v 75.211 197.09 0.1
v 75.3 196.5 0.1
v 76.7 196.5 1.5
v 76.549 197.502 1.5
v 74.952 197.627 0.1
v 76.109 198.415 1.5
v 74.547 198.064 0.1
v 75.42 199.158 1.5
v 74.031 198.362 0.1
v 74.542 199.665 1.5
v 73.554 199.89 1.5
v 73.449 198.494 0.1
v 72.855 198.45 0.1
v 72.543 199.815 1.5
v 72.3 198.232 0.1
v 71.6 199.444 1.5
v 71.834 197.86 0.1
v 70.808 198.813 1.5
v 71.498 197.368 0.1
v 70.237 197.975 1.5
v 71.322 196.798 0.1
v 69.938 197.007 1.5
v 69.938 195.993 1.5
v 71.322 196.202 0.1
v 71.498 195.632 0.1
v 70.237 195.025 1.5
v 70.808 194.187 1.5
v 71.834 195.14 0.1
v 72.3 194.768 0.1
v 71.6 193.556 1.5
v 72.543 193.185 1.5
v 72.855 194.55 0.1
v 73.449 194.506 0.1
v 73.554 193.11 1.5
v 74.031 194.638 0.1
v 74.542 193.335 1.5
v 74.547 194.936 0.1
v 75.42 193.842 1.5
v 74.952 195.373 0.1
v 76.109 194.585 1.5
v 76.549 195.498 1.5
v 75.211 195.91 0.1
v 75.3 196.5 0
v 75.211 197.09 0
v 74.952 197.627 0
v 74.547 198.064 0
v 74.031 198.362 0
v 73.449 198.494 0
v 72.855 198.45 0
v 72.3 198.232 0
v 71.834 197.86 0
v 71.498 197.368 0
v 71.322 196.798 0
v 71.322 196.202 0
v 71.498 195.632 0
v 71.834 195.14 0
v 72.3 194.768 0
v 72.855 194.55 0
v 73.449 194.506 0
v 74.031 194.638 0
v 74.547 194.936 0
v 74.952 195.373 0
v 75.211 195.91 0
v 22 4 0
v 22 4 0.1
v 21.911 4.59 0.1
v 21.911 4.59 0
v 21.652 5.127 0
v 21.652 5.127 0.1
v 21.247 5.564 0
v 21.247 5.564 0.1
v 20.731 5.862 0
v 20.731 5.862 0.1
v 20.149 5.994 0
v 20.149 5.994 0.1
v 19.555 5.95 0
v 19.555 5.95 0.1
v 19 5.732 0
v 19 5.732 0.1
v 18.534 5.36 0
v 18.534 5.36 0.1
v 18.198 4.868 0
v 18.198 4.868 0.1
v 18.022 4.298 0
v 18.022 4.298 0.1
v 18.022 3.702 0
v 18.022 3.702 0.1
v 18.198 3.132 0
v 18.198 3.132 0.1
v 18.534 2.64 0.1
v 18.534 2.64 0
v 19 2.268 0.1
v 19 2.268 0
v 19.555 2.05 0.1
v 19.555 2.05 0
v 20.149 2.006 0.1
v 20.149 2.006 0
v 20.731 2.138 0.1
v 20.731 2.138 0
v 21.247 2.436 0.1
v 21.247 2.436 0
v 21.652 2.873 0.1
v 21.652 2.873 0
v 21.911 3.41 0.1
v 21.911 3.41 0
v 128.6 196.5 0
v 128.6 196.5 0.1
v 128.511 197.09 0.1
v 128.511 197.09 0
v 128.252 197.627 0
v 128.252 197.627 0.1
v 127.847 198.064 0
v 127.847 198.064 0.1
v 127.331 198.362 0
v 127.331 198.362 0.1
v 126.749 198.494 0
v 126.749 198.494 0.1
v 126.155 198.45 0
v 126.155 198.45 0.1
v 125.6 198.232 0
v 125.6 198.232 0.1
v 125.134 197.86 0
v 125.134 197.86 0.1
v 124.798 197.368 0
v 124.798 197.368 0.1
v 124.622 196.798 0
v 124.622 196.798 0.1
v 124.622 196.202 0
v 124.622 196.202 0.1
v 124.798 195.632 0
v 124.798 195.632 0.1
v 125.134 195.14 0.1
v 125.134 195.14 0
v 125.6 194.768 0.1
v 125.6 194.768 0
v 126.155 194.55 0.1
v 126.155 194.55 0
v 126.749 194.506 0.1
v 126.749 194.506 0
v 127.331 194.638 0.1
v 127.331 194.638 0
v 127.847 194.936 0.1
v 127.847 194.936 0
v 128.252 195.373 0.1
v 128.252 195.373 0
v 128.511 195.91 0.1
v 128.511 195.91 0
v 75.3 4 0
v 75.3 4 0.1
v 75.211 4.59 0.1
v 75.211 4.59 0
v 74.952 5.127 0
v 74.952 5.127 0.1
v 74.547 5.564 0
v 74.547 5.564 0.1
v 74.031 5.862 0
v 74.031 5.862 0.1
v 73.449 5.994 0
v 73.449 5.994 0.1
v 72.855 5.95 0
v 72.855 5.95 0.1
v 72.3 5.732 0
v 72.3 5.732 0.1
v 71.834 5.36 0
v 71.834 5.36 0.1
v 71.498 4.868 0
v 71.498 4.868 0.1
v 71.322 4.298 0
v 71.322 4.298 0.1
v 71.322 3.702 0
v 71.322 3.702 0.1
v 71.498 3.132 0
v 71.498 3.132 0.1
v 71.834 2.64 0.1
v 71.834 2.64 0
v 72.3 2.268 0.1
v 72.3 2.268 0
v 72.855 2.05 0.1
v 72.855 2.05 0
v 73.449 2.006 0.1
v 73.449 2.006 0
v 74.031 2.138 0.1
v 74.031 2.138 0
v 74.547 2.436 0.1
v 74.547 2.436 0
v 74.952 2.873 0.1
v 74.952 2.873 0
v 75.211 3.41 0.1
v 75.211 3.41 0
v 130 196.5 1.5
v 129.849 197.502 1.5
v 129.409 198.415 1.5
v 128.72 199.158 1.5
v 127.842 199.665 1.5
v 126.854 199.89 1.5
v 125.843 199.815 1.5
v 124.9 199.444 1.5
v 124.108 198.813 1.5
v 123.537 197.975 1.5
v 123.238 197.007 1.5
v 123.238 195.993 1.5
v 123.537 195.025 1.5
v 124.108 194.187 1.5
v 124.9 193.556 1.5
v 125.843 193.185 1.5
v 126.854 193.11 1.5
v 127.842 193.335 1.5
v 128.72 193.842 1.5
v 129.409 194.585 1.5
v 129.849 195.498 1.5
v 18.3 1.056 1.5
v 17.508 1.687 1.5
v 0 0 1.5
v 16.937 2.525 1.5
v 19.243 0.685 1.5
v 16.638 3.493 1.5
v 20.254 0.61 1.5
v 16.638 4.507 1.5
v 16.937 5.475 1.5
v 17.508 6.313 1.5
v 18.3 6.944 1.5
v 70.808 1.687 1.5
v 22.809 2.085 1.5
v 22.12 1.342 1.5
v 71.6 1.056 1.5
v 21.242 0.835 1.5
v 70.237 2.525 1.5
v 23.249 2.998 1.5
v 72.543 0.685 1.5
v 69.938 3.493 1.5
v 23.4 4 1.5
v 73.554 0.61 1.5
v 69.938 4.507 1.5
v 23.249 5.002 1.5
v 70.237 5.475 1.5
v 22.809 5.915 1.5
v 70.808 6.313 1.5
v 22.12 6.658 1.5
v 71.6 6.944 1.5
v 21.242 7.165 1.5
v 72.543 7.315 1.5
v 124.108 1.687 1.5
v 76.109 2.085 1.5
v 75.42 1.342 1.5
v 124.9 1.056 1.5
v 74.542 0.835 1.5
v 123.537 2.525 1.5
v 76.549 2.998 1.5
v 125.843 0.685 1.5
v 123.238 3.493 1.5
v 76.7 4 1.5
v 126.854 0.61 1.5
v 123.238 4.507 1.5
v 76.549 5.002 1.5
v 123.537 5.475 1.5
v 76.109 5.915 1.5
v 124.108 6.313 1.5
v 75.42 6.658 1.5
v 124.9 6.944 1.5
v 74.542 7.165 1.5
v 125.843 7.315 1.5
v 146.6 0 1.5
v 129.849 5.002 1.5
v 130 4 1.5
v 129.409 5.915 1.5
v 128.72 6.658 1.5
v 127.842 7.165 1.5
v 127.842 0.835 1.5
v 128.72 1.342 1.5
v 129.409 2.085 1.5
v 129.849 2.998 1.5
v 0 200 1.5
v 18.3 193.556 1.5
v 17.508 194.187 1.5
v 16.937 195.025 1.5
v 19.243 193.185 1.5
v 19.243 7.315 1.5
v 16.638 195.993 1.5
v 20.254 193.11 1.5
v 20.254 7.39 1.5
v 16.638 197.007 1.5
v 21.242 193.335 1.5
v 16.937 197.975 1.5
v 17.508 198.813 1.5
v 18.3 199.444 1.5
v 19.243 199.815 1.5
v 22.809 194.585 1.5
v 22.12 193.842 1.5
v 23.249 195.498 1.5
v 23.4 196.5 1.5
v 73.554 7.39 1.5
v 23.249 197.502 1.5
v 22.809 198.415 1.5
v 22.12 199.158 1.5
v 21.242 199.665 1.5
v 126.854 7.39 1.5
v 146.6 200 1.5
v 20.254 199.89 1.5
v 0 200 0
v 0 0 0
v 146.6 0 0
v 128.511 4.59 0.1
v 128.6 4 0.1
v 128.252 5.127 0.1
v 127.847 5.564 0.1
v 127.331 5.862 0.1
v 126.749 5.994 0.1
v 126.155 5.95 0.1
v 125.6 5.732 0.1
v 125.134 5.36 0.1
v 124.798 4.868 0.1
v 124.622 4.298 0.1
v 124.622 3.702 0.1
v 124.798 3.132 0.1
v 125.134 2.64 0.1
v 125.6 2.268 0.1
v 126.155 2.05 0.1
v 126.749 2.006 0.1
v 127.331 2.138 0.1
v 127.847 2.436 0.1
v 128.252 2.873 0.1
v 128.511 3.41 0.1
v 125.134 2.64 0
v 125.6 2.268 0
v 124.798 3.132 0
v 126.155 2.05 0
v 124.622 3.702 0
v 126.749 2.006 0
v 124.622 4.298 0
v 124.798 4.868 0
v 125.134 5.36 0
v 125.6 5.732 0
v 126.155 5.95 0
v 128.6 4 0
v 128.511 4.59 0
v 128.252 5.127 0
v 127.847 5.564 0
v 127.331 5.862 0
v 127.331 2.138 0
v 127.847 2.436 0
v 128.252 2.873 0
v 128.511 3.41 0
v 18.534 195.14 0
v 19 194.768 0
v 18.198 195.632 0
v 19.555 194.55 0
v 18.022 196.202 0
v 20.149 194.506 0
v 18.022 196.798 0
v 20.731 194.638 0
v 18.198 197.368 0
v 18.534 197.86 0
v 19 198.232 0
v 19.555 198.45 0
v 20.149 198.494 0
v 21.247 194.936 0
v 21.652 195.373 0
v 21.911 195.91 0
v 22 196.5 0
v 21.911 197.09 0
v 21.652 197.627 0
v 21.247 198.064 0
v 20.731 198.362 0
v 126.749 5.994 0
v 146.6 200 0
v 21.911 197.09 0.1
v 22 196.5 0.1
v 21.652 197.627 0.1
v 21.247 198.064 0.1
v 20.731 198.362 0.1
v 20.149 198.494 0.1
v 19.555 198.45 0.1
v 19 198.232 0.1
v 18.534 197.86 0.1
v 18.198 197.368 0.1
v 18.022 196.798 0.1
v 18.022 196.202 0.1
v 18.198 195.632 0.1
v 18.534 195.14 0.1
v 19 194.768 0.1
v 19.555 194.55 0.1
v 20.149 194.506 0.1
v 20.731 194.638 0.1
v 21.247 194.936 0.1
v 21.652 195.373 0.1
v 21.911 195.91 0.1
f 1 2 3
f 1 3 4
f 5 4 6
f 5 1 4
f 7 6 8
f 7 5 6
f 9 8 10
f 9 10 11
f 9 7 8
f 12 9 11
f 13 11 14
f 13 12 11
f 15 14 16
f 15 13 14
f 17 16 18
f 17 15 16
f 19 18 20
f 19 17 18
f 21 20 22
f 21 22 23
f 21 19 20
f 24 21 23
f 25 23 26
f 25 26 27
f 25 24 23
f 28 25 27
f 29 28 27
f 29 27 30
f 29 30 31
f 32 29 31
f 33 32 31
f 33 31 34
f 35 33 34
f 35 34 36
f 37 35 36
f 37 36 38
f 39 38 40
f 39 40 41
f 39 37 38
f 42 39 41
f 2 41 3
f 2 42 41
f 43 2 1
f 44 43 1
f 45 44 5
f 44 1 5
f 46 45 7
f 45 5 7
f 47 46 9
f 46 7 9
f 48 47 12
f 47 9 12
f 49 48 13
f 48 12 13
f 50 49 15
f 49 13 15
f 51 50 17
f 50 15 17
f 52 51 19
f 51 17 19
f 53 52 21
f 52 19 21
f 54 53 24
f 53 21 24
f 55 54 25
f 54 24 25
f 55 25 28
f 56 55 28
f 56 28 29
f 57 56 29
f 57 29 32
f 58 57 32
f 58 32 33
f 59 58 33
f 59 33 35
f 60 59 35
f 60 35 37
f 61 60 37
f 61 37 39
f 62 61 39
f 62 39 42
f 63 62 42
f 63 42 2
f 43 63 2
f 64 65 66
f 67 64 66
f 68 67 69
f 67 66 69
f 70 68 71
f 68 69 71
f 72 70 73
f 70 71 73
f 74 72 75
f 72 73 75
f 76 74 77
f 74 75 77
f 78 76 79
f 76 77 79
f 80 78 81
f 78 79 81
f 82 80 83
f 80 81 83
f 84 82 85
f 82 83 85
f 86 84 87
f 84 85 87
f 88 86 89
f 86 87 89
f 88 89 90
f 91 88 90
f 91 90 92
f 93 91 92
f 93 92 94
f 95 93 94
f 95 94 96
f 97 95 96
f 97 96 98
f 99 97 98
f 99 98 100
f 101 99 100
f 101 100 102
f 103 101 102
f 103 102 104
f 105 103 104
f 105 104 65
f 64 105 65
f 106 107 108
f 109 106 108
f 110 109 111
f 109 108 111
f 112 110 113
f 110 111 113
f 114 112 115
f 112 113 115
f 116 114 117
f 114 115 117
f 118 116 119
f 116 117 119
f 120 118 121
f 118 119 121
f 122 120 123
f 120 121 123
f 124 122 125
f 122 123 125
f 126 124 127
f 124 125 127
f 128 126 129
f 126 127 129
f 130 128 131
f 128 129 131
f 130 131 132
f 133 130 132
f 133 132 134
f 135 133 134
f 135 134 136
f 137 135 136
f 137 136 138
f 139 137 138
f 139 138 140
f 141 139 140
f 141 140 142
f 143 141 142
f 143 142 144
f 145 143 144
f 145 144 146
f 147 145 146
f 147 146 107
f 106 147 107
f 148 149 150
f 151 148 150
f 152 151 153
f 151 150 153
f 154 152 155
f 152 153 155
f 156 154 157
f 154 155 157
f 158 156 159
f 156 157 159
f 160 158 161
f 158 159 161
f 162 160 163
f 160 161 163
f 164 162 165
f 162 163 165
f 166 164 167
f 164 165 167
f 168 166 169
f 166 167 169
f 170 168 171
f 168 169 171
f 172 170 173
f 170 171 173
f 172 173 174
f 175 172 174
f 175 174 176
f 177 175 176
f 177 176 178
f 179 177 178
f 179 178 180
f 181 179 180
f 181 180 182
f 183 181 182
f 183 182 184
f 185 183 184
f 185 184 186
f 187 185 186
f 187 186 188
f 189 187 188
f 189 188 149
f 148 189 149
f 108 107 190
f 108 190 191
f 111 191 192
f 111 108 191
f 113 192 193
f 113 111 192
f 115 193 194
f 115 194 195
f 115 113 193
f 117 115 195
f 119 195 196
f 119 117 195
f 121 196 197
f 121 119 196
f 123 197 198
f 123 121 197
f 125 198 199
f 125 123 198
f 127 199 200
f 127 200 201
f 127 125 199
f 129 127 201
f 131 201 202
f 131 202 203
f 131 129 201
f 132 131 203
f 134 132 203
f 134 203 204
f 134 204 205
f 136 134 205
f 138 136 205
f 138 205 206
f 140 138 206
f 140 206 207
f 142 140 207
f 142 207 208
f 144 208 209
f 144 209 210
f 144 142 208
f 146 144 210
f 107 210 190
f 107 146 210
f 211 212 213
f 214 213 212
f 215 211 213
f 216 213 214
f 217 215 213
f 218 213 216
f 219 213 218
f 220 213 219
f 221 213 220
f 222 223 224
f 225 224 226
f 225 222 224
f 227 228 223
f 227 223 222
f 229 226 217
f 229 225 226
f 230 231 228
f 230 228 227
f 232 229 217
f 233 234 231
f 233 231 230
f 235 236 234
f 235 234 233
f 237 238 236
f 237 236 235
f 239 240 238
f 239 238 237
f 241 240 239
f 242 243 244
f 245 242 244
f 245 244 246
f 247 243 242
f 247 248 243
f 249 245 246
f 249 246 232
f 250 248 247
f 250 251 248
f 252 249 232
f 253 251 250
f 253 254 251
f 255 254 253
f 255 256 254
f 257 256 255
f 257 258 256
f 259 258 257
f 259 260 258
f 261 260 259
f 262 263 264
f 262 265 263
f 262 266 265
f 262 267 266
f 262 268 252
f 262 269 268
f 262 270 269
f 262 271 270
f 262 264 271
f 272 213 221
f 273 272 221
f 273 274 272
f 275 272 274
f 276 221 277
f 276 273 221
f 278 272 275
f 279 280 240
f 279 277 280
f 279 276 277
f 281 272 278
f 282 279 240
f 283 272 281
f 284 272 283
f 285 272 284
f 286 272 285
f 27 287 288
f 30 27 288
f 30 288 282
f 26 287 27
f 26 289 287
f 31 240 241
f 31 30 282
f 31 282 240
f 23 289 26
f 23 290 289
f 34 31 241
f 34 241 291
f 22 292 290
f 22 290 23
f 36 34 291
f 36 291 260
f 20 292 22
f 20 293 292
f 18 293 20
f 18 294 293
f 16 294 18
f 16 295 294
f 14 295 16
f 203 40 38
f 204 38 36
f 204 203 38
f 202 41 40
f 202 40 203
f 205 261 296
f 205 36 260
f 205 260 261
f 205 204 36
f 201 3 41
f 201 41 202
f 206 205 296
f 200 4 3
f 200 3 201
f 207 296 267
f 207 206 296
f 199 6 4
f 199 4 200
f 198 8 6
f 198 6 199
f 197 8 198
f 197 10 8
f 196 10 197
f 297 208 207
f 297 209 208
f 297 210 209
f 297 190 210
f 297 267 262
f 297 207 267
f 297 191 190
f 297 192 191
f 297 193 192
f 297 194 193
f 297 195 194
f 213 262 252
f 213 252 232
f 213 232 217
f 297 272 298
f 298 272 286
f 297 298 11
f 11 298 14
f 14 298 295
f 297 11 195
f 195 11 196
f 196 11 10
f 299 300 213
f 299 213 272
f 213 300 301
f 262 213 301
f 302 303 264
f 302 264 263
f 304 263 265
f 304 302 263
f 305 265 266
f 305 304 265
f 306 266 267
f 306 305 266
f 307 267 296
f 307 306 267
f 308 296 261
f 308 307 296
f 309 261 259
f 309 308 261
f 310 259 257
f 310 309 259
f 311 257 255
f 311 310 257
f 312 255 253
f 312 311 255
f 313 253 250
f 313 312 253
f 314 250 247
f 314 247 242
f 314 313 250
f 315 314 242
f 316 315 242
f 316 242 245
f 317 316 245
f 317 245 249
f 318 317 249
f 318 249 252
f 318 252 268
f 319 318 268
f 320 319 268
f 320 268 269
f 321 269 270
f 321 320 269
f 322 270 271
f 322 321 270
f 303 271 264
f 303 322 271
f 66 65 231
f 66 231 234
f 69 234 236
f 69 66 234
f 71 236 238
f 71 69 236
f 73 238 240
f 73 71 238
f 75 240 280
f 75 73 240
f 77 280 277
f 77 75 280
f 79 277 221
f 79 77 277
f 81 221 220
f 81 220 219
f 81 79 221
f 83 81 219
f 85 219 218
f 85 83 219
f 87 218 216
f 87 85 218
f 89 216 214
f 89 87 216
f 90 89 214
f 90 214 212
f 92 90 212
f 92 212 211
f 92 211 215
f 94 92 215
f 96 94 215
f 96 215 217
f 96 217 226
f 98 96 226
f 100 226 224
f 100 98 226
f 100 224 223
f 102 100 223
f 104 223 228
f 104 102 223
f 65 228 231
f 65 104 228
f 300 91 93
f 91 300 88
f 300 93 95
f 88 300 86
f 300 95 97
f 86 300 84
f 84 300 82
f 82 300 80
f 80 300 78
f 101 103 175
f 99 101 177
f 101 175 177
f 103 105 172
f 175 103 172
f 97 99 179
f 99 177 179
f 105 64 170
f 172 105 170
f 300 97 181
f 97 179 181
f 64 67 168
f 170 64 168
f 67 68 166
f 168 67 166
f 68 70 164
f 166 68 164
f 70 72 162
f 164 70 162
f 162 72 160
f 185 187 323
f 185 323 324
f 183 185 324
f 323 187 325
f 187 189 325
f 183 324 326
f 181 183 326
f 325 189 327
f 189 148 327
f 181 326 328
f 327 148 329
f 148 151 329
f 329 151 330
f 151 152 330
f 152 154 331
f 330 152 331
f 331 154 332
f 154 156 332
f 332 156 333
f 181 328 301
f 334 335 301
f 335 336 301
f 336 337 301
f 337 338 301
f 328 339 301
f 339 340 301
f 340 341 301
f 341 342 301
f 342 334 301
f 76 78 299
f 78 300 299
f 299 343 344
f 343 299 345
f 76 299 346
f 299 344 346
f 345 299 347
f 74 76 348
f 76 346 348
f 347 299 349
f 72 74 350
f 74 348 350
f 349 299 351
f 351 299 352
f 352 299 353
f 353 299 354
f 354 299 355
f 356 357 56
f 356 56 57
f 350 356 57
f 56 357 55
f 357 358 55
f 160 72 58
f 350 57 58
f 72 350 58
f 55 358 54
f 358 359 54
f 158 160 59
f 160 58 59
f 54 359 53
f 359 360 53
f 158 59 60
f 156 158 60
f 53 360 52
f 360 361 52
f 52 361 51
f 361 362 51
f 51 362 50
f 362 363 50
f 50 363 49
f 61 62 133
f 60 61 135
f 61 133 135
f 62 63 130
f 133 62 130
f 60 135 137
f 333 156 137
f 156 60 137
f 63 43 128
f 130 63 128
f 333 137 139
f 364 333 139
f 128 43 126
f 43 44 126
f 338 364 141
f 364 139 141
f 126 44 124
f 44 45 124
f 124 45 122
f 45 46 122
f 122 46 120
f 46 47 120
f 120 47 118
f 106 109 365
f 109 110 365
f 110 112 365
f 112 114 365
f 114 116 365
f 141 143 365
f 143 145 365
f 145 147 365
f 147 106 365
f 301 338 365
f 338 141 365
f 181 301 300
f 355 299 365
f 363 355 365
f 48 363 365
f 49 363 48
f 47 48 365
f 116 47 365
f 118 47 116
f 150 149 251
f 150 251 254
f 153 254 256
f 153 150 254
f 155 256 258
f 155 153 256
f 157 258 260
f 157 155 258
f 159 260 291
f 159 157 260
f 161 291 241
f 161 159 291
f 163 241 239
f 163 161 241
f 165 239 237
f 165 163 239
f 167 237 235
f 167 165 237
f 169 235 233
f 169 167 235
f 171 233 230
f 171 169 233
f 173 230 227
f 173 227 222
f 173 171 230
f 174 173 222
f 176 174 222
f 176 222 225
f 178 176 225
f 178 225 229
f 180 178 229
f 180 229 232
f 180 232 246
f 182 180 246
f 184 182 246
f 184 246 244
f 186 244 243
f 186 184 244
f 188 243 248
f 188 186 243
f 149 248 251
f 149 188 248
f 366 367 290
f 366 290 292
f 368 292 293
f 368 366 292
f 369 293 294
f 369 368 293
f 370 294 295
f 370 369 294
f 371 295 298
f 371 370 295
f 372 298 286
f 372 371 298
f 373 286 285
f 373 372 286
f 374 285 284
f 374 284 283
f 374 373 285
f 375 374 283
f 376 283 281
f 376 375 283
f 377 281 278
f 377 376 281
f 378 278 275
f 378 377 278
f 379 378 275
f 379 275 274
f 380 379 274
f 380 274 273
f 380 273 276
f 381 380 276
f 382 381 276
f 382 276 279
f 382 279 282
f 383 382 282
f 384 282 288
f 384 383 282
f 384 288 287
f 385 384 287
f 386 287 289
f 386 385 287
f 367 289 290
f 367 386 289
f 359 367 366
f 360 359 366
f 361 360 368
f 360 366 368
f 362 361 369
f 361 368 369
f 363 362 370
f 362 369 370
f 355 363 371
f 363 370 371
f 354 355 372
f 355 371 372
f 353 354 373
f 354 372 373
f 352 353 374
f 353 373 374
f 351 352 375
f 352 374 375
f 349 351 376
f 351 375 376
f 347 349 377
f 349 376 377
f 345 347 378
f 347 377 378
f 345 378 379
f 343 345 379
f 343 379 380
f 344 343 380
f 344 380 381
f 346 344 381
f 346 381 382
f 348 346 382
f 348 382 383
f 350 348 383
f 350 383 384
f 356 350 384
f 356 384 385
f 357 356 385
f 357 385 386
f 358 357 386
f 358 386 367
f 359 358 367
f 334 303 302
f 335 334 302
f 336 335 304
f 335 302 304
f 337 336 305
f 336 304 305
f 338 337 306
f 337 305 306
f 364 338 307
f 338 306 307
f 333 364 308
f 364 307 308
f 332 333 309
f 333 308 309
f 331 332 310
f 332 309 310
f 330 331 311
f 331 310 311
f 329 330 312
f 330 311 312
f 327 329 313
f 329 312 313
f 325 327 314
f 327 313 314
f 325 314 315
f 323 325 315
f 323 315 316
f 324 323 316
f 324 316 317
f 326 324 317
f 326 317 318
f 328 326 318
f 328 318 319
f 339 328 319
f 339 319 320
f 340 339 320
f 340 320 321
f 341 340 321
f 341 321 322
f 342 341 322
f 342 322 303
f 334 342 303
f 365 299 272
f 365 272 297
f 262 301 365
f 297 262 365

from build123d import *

# Parameters (mm, degrees)
SKETCH_1_W          = 146.6
SKETCH_1_H          = 200
EXTRUDE_1_DEPTH     = 1.5
SKETCH_2_R          = 2
CUT_EXTRUDE_1_DEPTH = 248.979454794
CHAMFER_1_SIZE      = 1.4


with BuildPart() as part:
    # Эскиз1 → Бобышка-Вытянуть1 (new body)
    with BuildSketch(Plane.XY):
        with Locations((73.3, 100)):
            Rectangle(SKETCH_1_W, SKETCH_1_H)
    extrude(amount=EXTRUDE_1_DEPTH)

    # Эскиз2 → Вырез-Вытянуть1 (cut, through all)
    with BuildSketch(Plane.XY.offset(1.5)):
        with Locations((20, 4)):
            Circle(SKETCH_2_R)
        with Locations((20, 196.5)):
            Circle(SKETCH_2_R)
        with Locations((73.3, 196.5)):
            Circle(SKETCH_2_R)
        with Locations((73.3, 4)):
            Circle(SKETCH_2_R)
        with Locations((126.6, 196.5)):
            Circle(SKETCH_2_R)
        with Locations((126.6, 4)):
            Circle(SKETCH_2_R)
    extrude(amount=-CUT_EXTRUDE_1_DEPTH, mode=Mode.SUBTRACT)

    # Фаска1
    chamfer_1_edges = [part.edges().sort_by_distance(p)[0] for p in [
        (124.6, 4, 1.5),
        (71.3, 196.5, 1.5),
        (71.3, 4, 1.5),
        (18, 196.5, 1.5),
        (124.6, 196.5, 1.5),
        (18, 4, 1.5),
    ]]
    chamfer(chamfer_1_edges, length=CHAMFER_1_SIZE)


solid = part.part
